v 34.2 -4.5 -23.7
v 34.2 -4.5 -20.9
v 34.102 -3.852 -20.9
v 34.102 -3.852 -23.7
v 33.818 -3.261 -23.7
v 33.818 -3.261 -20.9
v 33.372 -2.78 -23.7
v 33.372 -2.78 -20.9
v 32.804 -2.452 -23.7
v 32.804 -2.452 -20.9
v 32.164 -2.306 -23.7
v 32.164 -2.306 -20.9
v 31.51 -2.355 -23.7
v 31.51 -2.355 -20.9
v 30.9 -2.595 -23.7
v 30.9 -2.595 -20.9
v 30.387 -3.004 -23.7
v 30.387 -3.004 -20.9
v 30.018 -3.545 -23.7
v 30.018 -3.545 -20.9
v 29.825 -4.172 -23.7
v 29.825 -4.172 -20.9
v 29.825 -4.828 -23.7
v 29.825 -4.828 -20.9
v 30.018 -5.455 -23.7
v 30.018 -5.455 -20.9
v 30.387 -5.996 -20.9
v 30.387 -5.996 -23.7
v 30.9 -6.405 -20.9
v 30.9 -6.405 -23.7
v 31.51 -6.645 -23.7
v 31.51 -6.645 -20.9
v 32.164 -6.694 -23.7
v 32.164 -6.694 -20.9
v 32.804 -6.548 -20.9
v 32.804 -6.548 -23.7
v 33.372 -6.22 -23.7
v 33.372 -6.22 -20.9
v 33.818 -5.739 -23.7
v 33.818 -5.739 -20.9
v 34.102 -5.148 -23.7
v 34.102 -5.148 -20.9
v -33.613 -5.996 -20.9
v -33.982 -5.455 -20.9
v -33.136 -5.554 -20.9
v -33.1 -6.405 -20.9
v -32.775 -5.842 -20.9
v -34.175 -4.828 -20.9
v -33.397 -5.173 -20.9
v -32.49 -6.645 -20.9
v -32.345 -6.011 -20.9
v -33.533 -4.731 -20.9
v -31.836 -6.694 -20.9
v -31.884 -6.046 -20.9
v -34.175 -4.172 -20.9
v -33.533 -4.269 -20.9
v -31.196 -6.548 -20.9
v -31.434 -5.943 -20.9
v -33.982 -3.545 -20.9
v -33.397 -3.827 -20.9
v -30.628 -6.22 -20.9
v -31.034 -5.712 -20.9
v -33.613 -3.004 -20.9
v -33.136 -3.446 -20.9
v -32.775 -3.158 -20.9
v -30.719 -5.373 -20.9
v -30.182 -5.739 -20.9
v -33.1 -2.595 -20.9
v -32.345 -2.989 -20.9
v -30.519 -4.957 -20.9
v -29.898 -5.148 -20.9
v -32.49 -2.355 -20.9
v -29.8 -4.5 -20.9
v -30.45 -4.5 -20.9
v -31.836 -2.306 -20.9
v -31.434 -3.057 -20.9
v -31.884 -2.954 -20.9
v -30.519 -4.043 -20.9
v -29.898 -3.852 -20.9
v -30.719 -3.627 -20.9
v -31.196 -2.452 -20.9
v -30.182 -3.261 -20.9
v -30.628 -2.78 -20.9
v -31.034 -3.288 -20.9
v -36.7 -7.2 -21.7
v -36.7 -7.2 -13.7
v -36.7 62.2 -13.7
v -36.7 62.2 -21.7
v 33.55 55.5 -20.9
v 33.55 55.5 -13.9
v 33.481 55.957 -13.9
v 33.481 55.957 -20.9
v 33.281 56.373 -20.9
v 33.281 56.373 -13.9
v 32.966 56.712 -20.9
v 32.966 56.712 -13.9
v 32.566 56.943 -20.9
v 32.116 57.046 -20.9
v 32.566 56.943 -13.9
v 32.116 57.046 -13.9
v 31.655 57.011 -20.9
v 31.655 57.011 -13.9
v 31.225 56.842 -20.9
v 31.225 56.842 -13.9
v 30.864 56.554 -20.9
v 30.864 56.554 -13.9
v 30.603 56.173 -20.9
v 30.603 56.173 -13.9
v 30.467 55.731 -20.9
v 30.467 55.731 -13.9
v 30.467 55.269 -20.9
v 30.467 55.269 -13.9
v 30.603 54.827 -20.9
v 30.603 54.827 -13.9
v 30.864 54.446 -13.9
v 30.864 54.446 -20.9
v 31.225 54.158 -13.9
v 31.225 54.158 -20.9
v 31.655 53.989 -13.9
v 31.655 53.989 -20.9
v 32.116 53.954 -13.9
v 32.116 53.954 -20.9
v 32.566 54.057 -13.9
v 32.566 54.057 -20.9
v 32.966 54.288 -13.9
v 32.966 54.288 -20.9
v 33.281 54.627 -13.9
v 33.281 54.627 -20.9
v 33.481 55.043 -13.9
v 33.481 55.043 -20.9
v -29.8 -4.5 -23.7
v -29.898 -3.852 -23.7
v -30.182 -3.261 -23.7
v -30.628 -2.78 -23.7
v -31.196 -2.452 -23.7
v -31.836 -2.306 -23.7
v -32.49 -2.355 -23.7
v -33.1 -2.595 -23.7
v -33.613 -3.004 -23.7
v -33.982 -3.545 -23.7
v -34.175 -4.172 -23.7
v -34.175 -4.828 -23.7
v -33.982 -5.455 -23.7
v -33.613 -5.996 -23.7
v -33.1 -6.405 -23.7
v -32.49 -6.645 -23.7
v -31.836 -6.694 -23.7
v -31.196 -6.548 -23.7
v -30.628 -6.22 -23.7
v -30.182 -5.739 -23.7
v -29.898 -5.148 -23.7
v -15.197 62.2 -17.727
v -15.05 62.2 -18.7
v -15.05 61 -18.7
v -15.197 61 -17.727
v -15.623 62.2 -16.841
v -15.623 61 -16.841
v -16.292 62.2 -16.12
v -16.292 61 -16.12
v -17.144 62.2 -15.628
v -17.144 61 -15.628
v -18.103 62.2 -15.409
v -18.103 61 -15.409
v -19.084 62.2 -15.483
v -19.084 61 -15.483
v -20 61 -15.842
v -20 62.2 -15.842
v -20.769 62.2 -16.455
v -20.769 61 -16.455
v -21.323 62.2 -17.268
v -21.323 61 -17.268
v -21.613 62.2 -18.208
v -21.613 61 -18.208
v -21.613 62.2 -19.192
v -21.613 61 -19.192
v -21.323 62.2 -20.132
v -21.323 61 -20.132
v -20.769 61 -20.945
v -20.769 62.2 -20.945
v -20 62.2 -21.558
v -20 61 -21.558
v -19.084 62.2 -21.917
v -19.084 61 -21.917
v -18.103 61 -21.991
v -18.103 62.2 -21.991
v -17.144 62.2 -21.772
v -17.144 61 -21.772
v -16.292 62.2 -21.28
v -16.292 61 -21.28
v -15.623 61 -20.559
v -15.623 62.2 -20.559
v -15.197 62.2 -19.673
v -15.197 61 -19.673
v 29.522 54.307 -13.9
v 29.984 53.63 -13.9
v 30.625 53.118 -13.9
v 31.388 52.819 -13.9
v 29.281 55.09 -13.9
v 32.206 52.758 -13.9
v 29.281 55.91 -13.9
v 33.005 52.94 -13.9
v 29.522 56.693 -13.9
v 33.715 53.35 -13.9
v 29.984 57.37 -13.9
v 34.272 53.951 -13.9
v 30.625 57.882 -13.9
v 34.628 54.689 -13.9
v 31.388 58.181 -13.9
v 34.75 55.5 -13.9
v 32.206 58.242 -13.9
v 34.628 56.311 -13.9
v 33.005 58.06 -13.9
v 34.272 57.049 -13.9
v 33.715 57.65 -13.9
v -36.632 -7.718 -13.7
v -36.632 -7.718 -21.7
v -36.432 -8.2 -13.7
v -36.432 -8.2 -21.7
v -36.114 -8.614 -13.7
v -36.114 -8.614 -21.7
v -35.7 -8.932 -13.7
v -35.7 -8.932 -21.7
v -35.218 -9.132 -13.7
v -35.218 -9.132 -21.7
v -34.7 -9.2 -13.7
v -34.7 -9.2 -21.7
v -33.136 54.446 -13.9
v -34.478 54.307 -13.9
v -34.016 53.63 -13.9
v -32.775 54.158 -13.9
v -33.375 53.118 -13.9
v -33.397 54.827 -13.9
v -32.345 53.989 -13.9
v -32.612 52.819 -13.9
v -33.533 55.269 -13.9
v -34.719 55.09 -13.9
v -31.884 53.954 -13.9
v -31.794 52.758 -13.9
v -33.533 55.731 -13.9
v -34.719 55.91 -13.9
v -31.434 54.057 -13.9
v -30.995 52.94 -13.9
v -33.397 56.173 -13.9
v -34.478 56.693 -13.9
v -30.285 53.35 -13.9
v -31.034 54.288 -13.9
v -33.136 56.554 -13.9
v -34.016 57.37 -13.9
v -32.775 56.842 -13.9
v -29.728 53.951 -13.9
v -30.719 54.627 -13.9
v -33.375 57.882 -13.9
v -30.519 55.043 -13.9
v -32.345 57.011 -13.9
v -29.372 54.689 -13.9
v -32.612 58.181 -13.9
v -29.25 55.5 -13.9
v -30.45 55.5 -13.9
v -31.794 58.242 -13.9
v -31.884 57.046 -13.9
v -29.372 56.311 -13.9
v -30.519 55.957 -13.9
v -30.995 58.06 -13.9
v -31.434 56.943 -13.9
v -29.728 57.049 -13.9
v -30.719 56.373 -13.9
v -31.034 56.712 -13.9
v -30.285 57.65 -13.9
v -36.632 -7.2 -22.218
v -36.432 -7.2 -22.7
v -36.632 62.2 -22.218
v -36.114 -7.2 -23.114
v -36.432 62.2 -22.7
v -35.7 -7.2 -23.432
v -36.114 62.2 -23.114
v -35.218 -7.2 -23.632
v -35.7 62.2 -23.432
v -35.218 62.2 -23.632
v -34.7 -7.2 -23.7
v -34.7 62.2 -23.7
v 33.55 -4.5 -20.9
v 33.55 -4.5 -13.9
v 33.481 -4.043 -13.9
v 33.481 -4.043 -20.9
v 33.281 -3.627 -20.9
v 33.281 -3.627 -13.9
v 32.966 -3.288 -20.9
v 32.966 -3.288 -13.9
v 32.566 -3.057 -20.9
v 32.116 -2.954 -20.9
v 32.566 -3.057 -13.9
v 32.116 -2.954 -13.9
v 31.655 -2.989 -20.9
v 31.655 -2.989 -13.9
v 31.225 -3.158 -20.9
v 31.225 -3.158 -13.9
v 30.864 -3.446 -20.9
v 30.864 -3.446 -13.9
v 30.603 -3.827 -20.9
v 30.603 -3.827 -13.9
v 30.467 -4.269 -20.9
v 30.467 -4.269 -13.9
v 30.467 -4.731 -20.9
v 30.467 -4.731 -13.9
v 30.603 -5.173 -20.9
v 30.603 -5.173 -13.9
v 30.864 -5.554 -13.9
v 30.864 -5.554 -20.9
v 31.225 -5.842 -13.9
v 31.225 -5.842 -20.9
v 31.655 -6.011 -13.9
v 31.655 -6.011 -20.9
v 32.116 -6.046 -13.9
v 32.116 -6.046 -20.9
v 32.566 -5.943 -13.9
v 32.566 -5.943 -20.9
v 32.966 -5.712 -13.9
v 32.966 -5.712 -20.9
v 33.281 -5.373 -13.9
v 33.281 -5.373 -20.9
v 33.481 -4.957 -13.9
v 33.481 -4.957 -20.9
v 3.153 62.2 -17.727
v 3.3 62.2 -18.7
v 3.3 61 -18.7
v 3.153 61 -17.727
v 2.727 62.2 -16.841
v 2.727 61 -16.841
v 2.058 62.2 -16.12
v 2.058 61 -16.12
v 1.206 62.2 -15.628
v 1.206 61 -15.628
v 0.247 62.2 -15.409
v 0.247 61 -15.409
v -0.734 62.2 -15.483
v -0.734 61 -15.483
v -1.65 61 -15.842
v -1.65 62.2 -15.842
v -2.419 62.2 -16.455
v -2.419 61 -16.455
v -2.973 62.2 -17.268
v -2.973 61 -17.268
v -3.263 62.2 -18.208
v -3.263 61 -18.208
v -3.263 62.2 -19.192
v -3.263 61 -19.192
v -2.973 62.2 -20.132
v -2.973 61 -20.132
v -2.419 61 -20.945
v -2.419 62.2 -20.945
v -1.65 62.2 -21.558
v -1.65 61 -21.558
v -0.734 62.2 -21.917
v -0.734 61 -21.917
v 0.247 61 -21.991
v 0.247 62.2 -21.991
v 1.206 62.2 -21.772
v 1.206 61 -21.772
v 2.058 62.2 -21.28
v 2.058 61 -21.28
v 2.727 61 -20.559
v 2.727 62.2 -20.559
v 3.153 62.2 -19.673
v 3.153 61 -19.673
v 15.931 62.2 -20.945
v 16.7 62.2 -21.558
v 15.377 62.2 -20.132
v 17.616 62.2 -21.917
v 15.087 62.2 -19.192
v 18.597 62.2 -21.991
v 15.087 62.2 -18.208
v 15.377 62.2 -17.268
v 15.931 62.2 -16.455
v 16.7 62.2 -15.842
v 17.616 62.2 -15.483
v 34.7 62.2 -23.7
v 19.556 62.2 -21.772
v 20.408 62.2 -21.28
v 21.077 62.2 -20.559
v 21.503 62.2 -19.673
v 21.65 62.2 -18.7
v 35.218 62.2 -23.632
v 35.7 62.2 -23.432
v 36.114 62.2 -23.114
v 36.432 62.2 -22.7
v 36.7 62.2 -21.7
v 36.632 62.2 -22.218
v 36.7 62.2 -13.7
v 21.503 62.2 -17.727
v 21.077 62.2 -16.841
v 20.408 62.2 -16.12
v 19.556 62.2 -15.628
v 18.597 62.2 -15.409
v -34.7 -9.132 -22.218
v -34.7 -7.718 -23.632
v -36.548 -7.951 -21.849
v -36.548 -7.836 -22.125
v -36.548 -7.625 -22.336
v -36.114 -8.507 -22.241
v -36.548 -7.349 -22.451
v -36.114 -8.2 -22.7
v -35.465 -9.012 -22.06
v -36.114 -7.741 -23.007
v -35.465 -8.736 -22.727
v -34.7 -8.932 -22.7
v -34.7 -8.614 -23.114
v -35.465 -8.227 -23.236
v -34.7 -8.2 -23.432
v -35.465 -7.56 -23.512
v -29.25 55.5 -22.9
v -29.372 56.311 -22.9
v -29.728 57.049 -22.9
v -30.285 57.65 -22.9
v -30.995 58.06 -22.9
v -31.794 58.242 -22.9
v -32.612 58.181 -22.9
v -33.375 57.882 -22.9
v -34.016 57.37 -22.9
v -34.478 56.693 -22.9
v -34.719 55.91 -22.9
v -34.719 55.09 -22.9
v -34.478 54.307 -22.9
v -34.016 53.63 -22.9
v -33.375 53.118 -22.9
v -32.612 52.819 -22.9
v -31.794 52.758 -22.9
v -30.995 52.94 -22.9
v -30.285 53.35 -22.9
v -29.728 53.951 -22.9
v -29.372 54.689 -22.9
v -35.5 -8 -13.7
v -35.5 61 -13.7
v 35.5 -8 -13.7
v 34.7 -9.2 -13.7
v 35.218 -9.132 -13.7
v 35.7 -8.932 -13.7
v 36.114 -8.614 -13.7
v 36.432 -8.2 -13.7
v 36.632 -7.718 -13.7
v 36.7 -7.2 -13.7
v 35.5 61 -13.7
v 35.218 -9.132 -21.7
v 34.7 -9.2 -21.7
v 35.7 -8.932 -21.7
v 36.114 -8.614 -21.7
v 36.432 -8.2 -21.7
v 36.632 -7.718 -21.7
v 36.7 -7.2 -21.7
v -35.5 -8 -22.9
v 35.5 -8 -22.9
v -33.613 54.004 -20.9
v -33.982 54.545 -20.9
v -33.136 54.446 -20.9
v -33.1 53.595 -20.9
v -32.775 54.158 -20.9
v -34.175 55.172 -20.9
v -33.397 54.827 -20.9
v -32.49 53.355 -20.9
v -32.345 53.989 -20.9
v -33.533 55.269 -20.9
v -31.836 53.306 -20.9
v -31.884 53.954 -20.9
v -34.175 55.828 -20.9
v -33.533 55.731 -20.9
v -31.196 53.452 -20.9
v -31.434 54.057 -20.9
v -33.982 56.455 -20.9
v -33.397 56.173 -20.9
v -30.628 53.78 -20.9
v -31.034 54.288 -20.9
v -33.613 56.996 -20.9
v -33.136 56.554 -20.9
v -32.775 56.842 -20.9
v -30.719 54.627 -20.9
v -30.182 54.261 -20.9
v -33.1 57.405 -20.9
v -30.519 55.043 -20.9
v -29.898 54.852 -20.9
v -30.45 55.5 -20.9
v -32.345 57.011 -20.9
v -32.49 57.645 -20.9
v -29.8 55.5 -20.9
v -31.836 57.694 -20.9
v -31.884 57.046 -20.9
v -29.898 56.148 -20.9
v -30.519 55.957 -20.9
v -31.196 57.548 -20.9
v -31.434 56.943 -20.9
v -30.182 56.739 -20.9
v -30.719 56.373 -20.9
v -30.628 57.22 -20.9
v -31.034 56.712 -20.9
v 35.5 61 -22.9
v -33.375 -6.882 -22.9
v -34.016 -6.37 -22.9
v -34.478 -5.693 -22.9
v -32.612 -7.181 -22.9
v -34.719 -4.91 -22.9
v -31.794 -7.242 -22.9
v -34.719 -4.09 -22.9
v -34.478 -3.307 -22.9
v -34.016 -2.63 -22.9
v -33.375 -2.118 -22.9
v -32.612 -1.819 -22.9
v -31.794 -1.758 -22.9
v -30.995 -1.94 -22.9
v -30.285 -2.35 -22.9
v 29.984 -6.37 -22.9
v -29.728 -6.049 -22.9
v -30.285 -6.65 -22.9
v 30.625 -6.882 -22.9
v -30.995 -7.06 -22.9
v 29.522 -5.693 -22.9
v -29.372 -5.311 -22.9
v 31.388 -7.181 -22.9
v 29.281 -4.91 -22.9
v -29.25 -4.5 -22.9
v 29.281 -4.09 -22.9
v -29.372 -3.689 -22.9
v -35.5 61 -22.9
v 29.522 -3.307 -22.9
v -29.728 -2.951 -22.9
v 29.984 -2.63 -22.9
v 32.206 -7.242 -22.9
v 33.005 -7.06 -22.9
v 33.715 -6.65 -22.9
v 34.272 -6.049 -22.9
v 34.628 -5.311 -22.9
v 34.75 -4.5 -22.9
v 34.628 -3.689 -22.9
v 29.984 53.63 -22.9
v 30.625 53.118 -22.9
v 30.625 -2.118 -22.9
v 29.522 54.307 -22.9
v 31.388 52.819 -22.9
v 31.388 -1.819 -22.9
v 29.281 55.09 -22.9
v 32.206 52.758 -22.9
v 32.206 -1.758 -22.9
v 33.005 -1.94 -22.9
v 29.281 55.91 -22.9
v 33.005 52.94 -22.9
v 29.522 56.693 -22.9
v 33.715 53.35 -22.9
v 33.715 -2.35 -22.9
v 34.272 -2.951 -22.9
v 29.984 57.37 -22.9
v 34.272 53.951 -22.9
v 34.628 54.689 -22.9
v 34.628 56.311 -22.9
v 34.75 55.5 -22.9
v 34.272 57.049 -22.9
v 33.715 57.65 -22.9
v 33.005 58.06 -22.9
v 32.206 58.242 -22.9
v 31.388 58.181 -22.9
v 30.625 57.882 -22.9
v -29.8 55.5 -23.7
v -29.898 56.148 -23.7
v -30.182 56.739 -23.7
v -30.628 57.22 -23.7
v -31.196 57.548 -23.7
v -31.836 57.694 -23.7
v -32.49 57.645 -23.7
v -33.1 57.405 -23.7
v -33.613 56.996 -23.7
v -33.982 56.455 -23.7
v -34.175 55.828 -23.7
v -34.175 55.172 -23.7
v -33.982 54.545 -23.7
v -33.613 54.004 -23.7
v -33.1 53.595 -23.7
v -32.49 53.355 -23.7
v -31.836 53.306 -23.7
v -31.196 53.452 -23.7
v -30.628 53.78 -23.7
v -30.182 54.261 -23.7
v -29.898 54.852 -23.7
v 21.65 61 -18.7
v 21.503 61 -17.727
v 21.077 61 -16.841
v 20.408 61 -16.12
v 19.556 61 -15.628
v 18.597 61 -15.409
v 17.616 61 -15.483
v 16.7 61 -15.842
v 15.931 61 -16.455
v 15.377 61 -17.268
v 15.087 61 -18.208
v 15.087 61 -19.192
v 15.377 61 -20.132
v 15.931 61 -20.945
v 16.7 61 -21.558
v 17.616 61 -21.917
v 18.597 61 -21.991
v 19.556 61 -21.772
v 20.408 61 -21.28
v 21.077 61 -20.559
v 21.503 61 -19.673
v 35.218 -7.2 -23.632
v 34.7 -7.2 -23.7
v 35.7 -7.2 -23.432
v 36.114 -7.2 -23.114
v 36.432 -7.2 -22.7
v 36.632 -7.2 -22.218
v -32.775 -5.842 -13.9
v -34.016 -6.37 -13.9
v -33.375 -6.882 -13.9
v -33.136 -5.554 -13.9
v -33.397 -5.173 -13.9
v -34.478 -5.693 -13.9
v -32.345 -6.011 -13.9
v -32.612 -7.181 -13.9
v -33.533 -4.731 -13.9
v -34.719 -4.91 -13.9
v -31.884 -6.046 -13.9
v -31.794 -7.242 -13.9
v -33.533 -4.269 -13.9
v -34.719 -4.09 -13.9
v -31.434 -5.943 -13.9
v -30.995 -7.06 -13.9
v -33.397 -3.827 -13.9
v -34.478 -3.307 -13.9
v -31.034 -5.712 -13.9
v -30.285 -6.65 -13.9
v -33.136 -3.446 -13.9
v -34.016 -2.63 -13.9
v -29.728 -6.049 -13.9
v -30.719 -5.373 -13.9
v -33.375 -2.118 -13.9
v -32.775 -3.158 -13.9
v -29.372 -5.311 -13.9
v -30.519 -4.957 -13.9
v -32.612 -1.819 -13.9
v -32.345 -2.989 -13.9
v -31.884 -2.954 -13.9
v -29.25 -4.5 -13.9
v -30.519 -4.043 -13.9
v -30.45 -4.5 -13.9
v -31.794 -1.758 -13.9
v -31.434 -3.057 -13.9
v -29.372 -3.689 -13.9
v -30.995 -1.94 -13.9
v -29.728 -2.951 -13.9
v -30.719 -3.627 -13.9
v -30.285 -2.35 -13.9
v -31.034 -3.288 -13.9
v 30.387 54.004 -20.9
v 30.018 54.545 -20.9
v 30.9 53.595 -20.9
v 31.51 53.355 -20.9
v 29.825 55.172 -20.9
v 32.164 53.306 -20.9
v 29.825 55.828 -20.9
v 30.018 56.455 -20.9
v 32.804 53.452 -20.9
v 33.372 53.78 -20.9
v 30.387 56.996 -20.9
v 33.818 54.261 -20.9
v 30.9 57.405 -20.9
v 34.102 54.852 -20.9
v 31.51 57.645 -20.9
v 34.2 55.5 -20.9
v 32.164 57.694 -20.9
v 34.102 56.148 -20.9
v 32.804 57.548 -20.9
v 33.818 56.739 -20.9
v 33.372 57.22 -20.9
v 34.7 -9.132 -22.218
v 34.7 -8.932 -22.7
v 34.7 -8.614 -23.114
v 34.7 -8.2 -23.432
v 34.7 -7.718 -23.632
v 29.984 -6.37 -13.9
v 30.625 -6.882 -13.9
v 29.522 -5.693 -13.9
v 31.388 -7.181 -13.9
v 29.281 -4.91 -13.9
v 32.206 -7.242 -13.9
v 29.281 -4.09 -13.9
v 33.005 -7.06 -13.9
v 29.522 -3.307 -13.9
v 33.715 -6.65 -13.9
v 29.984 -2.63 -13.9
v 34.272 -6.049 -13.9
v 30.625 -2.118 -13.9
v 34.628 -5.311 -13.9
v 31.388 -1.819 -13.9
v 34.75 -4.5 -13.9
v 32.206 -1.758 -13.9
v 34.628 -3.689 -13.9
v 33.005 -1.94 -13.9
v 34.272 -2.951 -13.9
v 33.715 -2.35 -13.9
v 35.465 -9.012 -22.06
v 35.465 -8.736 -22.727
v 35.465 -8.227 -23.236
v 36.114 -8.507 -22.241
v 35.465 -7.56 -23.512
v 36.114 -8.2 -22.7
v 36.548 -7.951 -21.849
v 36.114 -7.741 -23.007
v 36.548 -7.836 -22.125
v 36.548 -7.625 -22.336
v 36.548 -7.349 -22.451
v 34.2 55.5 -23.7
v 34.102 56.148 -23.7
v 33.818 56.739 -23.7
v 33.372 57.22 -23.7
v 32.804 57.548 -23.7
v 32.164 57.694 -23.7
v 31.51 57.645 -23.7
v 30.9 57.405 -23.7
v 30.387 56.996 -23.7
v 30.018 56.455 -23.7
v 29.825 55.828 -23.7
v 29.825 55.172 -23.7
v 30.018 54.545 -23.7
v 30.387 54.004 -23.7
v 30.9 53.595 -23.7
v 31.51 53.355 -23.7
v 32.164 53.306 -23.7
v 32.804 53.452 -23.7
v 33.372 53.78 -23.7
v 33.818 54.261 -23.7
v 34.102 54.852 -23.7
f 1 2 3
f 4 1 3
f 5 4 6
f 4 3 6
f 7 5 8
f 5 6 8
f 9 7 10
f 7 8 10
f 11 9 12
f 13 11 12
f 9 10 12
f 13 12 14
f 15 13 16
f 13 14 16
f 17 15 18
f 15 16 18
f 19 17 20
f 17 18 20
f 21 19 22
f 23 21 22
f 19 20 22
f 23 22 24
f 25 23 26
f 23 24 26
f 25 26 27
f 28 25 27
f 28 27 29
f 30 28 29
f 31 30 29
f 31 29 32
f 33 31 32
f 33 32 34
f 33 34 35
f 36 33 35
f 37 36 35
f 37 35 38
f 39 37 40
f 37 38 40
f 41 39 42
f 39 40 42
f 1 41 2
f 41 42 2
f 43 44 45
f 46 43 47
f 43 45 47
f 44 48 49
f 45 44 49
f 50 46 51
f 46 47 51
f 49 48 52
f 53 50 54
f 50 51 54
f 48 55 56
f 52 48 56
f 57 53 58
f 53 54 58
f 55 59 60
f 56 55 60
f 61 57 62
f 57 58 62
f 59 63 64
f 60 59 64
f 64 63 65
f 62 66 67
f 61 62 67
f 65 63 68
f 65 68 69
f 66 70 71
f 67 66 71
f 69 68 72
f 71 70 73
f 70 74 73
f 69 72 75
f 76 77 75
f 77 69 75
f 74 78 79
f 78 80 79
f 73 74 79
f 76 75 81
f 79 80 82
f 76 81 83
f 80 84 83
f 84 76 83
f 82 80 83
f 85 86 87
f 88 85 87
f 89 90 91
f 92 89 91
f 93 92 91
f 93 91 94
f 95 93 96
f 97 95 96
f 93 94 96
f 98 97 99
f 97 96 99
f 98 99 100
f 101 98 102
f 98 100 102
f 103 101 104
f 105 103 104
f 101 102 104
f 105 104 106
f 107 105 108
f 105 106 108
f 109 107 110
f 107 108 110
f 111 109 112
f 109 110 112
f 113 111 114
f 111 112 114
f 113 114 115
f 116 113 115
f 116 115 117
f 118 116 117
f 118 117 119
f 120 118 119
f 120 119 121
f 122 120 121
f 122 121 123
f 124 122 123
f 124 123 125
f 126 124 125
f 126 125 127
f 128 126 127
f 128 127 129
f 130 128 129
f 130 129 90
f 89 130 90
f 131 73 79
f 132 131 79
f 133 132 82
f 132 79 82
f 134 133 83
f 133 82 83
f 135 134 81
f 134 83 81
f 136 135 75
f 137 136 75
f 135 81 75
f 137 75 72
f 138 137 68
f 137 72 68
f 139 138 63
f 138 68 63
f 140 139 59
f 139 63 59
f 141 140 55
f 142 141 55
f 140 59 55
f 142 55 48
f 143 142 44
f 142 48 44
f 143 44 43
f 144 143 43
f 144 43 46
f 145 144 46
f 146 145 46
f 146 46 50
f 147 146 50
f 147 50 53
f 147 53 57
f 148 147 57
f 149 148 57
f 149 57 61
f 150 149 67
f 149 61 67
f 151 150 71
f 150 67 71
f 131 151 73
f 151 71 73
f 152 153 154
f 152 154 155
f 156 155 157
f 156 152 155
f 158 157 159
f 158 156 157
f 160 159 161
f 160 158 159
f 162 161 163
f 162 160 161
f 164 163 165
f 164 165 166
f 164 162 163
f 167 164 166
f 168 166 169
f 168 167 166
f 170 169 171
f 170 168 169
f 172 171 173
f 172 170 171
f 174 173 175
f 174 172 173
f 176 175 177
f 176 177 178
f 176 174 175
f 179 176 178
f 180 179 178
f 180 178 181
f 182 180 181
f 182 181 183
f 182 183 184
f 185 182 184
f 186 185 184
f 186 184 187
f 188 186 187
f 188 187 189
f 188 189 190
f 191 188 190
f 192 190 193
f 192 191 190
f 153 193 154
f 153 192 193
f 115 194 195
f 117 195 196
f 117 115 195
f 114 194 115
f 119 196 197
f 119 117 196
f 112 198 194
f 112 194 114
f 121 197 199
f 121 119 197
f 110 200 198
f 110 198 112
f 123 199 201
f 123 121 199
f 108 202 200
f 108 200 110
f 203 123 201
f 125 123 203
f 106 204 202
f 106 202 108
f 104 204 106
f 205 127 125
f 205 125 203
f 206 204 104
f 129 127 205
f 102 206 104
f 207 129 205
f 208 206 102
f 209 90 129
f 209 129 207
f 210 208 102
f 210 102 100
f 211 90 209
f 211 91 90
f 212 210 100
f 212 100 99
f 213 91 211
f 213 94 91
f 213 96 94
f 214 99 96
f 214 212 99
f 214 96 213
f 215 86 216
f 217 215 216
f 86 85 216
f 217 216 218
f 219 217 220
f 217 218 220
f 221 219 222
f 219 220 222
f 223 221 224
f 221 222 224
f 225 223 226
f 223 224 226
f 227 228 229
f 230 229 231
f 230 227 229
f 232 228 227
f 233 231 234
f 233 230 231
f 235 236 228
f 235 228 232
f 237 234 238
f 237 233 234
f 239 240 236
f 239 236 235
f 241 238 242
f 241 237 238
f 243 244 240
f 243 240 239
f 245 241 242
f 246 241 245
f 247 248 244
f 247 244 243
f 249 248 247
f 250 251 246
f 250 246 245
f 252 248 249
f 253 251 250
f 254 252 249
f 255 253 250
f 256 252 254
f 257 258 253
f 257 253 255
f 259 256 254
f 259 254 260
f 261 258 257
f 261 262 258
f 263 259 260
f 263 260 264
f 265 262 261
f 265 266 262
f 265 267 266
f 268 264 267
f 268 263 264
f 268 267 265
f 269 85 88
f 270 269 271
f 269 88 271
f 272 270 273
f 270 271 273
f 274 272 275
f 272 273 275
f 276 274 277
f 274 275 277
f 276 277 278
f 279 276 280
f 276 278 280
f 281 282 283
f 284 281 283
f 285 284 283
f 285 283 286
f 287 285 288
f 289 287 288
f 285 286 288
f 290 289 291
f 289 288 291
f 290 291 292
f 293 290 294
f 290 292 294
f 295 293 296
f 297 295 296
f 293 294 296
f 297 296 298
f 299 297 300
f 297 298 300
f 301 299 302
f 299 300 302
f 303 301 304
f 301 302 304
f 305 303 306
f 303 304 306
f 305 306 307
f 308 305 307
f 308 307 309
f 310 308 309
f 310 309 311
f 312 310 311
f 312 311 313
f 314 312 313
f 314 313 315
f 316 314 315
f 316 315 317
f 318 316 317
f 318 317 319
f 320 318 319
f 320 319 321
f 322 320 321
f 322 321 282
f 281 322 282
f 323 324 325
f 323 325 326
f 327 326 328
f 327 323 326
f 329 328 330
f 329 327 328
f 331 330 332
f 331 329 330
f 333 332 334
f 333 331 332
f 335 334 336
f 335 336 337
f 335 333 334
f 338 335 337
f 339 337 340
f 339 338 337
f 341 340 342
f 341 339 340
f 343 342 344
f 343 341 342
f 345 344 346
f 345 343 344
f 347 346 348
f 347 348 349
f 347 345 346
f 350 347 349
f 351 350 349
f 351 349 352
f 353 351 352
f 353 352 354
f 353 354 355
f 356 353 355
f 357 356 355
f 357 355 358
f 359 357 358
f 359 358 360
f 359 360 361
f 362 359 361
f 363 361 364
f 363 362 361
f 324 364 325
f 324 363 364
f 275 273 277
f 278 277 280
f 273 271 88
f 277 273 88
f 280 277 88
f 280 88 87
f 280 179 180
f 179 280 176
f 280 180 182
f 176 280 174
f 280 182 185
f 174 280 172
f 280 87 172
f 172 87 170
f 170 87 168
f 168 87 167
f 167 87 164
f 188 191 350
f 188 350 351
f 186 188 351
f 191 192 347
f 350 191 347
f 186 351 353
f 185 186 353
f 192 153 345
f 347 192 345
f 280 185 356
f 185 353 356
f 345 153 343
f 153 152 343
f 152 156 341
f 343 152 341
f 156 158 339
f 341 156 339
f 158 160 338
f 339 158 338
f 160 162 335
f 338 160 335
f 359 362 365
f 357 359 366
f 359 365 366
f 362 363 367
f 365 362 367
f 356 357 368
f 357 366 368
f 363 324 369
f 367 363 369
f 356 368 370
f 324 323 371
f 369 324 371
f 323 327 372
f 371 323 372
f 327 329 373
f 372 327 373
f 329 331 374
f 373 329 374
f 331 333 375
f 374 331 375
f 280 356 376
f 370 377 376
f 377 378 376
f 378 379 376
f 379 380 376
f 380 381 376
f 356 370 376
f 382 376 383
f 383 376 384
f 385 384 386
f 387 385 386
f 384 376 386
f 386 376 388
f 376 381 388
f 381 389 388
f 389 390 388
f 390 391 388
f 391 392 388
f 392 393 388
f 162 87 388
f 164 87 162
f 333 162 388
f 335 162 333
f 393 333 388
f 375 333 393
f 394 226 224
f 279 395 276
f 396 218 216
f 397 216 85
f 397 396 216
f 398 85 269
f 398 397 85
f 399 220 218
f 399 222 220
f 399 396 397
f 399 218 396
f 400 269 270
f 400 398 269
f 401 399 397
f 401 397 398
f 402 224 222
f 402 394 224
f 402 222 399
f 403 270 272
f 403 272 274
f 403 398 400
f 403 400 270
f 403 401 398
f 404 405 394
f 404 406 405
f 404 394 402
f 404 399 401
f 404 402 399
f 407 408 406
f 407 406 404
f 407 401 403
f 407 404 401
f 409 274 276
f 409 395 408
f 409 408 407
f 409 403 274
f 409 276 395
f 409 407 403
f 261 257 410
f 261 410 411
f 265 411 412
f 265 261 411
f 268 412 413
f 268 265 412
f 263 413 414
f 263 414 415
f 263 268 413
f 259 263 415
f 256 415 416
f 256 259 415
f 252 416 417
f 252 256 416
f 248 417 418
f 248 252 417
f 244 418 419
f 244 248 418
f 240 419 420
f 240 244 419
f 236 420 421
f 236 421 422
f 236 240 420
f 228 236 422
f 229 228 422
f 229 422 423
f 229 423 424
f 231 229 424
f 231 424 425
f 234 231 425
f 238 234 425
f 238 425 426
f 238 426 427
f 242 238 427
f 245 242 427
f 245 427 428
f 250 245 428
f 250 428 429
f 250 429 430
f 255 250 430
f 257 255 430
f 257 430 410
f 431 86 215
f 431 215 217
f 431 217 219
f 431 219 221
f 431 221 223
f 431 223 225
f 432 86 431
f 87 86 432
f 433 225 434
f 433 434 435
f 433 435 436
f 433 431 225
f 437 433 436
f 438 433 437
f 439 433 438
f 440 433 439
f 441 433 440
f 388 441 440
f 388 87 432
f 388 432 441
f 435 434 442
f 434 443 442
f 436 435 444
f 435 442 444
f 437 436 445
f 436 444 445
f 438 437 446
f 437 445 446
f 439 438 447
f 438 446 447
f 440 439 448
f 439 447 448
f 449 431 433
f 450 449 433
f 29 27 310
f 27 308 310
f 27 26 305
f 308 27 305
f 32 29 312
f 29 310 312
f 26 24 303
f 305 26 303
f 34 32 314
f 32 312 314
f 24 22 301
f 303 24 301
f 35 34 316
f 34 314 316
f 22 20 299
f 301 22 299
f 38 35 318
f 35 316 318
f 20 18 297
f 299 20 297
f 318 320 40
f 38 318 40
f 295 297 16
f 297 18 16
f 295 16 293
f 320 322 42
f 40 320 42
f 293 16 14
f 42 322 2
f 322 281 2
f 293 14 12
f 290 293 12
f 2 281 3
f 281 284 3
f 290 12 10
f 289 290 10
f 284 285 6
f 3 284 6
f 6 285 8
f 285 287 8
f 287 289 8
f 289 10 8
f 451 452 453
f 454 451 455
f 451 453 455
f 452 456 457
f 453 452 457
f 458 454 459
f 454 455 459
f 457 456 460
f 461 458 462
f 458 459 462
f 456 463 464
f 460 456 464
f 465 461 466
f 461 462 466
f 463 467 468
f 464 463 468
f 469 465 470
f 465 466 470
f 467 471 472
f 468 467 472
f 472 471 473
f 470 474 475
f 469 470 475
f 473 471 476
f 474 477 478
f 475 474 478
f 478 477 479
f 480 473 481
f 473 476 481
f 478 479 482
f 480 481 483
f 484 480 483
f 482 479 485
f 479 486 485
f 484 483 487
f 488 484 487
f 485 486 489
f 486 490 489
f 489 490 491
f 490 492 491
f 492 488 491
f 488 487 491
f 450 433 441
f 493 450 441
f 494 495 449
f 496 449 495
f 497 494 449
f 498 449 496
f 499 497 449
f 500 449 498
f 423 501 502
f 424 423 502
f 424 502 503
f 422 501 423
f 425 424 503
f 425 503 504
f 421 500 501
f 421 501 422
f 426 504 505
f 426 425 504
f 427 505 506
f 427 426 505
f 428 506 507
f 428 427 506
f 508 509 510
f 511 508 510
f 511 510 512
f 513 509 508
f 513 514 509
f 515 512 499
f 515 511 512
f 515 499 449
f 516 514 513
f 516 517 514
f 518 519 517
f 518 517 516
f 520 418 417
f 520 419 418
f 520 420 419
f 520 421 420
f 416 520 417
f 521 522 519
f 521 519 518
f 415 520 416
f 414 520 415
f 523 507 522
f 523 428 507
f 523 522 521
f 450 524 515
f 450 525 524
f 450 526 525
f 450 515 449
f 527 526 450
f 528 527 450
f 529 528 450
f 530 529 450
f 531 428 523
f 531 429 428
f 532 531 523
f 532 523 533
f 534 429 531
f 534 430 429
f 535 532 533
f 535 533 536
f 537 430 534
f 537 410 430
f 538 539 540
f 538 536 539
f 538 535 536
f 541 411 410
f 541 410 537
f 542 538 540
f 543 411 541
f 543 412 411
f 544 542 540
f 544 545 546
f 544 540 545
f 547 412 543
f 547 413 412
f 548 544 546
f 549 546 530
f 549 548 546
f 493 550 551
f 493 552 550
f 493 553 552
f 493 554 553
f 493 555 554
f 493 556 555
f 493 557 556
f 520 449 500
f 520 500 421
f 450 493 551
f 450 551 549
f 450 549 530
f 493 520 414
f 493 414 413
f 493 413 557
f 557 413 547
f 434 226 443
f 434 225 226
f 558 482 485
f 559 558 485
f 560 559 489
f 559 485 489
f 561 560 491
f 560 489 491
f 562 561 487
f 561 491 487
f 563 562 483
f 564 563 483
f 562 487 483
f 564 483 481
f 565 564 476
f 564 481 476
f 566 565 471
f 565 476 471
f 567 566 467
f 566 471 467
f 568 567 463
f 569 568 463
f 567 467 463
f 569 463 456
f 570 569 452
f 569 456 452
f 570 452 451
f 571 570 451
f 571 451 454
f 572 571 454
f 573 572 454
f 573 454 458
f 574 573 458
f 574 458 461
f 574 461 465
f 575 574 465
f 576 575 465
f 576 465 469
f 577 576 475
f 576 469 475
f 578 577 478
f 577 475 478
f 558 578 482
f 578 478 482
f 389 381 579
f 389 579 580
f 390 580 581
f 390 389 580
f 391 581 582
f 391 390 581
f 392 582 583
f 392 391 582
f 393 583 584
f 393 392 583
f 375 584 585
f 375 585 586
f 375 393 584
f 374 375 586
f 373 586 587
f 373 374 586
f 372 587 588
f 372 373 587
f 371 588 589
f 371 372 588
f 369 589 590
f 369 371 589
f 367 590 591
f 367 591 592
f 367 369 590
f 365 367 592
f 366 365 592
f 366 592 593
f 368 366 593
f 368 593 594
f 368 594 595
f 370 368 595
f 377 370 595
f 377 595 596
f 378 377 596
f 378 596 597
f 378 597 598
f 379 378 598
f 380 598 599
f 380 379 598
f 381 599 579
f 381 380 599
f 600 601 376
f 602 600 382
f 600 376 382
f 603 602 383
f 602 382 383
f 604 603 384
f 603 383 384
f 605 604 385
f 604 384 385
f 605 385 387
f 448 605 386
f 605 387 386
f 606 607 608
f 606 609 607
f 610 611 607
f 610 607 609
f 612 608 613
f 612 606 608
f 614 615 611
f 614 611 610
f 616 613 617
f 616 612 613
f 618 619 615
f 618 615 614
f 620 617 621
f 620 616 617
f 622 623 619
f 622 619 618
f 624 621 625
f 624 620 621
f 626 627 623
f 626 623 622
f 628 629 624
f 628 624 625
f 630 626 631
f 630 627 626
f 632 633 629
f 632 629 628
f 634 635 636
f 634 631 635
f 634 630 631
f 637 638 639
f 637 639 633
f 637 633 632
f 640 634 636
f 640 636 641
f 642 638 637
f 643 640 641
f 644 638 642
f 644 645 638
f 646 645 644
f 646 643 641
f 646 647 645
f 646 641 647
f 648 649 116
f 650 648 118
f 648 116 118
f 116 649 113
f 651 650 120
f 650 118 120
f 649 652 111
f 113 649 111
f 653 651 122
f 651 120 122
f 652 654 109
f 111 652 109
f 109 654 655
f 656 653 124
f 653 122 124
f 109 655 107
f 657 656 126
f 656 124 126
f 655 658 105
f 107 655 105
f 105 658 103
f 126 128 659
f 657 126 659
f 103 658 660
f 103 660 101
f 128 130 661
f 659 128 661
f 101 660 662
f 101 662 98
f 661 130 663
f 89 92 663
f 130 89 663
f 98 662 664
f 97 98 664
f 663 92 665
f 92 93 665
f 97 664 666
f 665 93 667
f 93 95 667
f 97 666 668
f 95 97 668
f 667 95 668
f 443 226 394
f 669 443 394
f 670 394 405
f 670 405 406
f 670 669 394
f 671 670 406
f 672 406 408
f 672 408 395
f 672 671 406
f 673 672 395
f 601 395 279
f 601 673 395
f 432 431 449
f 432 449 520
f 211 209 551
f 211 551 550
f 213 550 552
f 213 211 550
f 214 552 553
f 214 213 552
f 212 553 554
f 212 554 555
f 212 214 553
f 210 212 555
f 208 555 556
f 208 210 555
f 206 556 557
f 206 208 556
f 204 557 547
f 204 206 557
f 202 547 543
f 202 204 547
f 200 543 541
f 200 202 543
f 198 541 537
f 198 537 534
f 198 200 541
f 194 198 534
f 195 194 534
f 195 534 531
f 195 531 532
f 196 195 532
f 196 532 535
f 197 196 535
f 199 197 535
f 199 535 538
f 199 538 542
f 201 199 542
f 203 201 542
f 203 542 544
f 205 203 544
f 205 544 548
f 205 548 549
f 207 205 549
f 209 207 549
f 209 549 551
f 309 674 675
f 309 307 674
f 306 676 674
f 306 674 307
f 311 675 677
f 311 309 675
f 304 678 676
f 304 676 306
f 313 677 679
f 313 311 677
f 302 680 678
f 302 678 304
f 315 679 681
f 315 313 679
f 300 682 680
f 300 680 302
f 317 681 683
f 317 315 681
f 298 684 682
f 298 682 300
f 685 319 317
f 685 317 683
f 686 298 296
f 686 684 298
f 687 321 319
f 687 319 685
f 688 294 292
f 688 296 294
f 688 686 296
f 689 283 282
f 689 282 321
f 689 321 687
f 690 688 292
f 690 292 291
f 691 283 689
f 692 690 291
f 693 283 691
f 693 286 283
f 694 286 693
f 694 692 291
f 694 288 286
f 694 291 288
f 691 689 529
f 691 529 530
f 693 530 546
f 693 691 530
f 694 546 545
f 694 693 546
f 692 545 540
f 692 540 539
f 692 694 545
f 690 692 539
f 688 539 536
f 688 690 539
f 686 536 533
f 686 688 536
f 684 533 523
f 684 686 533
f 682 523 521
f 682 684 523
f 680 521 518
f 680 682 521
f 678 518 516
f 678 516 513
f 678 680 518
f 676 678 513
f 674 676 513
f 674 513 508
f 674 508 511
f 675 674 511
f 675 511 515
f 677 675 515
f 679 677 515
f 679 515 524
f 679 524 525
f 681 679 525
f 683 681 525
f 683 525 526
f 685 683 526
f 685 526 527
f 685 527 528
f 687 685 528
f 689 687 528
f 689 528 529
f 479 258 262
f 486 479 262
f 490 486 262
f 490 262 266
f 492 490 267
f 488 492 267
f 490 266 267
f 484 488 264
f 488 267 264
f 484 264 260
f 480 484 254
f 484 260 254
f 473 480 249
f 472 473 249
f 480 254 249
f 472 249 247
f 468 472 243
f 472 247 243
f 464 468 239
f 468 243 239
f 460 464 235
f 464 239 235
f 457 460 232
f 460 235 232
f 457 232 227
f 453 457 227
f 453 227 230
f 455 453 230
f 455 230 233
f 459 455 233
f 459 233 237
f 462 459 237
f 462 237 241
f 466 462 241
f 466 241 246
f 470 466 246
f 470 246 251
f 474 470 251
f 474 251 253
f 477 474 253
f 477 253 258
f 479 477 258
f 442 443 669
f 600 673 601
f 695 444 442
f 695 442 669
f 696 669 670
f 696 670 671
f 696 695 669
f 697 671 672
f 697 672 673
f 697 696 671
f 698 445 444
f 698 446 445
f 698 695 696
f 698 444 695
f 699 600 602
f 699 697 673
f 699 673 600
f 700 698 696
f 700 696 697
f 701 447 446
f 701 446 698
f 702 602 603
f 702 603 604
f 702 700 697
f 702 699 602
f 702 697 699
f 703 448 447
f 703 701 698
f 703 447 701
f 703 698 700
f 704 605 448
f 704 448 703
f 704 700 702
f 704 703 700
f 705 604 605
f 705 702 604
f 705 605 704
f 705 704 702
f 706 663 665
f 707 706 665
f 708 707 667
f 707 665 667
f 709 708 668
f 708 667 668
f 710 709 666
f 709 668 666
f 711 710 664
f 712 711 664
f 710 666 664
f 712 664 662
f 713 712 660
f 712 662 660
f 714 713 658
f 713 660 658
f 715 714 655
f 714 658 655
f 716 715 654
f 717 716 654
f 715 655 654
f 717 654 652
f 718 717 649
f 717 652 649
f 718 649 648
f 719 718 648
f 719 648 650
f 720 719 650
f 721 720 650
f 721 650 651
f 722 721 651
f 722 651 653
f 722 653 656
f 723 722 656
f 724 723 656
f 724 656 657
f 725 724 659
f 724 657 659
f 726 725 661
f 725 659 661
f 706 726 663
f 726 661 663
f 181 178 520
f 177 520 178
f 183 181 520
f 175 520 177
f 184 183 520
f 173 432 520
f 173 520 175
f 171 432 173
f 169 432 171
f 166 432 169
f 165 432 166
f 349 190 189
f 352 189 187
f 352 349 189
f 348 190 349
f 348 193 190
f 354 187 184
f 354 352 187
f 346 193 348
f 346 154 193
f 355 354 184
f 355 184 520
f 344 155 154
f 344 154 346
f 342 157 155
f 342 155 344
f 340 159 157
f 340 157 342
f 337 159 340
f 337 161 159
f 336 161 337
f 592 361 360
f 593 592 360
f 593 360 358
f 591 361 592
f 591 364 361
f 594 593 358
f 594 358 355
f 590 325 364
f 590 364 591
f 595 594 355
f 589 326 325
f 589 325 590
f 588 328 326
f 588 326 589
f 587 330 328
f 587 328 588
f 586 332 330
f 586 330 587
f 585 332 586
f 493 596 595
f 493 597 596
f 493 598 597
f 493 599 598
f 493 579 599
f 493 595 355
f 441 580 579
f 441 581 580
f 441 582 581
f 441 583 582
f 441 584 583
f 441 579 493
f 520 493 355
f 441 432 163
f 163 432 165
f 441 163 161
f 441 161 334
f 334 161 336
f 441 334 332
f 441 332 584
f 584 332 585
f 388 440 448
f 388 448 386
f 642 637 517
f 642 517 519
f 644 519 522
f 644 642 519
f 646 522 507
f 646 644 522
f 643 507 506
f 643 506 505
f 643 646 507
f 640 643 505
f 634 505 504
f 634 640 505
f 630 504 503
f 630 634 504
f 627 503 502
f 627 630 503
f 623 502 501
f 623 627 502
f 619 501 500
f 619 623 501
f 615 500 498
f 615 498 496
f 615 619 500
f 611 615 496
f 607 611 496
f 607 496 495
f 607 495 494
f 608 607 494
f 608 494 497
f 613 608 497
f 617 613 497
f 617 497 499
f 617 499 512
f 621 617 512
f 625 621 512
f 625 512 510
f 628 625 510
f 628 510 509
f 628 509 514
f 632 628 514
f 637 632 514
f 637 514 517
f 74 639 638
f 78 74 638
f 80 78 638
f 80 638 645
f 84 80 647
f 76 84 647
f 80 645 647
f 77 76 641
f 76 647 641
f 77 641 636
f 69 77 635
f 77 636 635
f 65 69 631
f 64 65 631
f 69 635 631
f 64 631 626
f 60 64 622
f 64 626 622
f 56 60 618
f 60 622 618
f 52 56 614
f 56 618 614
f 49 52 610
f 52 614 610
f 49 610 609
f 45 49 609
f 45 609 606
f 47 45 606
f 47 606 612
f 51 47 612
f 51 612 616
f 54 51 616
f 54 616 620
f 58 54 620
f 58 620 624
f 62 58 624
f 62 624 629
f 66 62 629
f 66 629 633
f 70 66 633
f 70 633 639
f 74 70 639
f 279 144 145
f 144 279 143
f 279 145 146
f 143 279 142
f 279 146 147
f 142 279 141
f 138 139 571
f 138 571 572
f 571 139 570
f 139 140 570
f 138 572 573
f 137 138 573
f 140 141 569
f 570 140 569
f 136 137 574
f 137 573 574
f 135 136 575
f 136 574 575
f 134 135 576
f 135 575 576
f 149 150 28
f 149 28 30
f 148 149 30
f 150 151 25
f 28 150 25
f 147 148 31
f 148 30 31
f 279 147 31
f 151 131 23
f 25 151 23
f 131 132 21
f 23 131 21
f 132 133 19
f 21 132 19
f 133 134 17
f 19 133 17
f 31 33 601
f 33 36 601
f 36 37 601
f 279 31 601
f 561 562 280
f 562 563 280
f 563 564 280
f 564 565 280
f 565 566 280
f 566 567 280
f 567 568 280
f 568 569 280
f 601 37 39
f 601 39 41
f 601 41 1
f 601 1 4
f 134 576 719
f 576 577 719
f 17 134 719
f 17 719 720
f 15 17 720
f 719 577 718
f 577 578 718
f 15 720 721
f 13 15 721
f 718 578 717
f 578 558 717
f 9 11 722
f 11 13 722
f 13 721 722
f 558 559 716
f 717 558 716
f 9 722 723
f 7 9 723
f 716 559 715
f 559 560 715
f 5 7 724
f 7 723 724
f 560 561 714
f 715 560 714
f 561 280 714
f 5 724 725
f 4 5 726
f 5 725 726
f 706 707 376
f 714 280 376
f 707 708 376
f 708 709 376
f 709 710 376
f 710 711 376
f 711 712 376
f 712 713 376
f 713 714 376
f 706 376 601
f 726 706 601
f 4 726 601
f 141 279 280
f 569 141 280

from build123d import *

# Parameters (mm, degrees)
SKETCH074_W     = 73.4
SKETCH074_H     = 71.4
PAD024_DEPTH    = 10
SKETCH075_W     = 71
SKETCH075_H     = 69
POCKET045_DEPTH = 9.2
SKETCH076_R     = 3.3
POCKET046_DEPTH = 1.2
SKETCH077_R     = 2.75
PAD025_DEPTH    = 9.8
SKETCH078_R     = 1.55
POCKET047_DEPTH = 10
SKETCH079_R     = 2.2
POCKET048_DEPTH = 2.8
FILLET001_R     = 2
FILLET002_R     = 2
FILLET003_R     = 2


with BuildPart() as part:
    # Sketch074 (on XY_Plane416 of Origin554) → Pad024 (new body)
    with BuildSketch(Plane.XY):
        with Locations((0, 26.5)):
            Rectangle(SKETCH074_W, SKETCH074_H)
    extrude(amount=-PAD024_DEPTH)

    # Sketch075 (on XY_Plane416 of Origin554) → Pocket045 (cut)
    with BuildSketch(Plane.XY):
        with Locations((0, 26.5)):
            Rectangle(SKETCH075_W, SKETCH075_H)
    extrude(amount=-POCKET045_DEPTH, mode=Mode.SUBTRACT)

    # Sketch076 (on XZ_Plane416 of Origin554) → Pocket046 (cut)
    with BuildSketch(Plane.XZ.offset(-62.2)):
        with Locations((18.35, -5)):
            Circle(SKETCH076_R)
        with Locations((0, -5)):
            Circle(SKETCH076_R)
        with Locations((-18.35, -5)):
            Circle(SKETCH076_R)
    extrude(amount=POCKET046_DEPTH, mode=Mode.SUBTRACT)

    # Sketch077 (on XY_Plane416 of Origin554) → Pad025 (join)
    with BuildSketch(Plane.XY.offset(-0.2)):
        with Locations((-32, 55.5)):
            Circle(SKETCH077_R)
        with Locations((32, 55.5)):
            Circle(SKETCH077_R)
        with Locations((32, -4.5)):
            Circle(SKETCH077_R)
        with Locations((-32, -4.5)):
            Circle(SKETCH077_R)
    extrude(amount=-PAD025_DEPTH)

    # Sketch078 (on XY_Plane416 of Origin554) → Pocket047 (cut)
    with BuildSketch(Plane.XY):
        with Locations((32, 55.5)):
            Circle(SKETCH078_R)
        with Locations((-32, 55.5)):
            Circle(SKETCH078_R)
        with Locations((-32, -4.5)):
            Circle(SKETCH078_R)
        with Locations((32, -4.5)):
            Circle(SKETCH078_R)
    extrude(amount=-POCKET047_DEPTH, mode=Mode.SUBTRACT)

    # Sketch079 (on XY_Plane416 of Origin554) → Pocket048 (cut)
    with BuildSketch(Plane.XY.offset(-7.2)):
        with Locations((-32, 55.5)):
            Circle(SKETCH079_R)
        with Locations((32, 55.5)):
            Circle(SKETCH079_R)
        with Locations((32, -4.5)):
            Circle(SKETCH079_R)
        with Locations((-32, -4.5)):
            Circle(SKETCH079_R)
    extrude(amount=-POCKET048_DEPTH, mode=Mode.SUBTRACT)

    # Fillet001
    fillet001_edges = [part.edges().sort_by_distance(p)[0] for p in [
        (0, -9.2, -10),
    ]]
    fillet(fillet001_edges, radius=FILLET001_R)

    # Fillet002
    fillet002_edges = [part.edges().sort_by_distance(p)[0] for p in [
        (36.7, 27.5, -10),
    ]]
    fillet(fillet002_edges, radius=FILLET002_R)

    # Fillet003
    fillet003_edges = [part.edges().sort_by_distance(p)[0] for p in [
        (-36.7, 27.5, -10),
    ]]
    fillet(fillet003_edges, radius=FILLET003_R)


with BuildPart() as part_1:
    # Body005 placement: moved
    add(part.part.moved(Location((0, 0, -13.7))))


solid = part_1.part
